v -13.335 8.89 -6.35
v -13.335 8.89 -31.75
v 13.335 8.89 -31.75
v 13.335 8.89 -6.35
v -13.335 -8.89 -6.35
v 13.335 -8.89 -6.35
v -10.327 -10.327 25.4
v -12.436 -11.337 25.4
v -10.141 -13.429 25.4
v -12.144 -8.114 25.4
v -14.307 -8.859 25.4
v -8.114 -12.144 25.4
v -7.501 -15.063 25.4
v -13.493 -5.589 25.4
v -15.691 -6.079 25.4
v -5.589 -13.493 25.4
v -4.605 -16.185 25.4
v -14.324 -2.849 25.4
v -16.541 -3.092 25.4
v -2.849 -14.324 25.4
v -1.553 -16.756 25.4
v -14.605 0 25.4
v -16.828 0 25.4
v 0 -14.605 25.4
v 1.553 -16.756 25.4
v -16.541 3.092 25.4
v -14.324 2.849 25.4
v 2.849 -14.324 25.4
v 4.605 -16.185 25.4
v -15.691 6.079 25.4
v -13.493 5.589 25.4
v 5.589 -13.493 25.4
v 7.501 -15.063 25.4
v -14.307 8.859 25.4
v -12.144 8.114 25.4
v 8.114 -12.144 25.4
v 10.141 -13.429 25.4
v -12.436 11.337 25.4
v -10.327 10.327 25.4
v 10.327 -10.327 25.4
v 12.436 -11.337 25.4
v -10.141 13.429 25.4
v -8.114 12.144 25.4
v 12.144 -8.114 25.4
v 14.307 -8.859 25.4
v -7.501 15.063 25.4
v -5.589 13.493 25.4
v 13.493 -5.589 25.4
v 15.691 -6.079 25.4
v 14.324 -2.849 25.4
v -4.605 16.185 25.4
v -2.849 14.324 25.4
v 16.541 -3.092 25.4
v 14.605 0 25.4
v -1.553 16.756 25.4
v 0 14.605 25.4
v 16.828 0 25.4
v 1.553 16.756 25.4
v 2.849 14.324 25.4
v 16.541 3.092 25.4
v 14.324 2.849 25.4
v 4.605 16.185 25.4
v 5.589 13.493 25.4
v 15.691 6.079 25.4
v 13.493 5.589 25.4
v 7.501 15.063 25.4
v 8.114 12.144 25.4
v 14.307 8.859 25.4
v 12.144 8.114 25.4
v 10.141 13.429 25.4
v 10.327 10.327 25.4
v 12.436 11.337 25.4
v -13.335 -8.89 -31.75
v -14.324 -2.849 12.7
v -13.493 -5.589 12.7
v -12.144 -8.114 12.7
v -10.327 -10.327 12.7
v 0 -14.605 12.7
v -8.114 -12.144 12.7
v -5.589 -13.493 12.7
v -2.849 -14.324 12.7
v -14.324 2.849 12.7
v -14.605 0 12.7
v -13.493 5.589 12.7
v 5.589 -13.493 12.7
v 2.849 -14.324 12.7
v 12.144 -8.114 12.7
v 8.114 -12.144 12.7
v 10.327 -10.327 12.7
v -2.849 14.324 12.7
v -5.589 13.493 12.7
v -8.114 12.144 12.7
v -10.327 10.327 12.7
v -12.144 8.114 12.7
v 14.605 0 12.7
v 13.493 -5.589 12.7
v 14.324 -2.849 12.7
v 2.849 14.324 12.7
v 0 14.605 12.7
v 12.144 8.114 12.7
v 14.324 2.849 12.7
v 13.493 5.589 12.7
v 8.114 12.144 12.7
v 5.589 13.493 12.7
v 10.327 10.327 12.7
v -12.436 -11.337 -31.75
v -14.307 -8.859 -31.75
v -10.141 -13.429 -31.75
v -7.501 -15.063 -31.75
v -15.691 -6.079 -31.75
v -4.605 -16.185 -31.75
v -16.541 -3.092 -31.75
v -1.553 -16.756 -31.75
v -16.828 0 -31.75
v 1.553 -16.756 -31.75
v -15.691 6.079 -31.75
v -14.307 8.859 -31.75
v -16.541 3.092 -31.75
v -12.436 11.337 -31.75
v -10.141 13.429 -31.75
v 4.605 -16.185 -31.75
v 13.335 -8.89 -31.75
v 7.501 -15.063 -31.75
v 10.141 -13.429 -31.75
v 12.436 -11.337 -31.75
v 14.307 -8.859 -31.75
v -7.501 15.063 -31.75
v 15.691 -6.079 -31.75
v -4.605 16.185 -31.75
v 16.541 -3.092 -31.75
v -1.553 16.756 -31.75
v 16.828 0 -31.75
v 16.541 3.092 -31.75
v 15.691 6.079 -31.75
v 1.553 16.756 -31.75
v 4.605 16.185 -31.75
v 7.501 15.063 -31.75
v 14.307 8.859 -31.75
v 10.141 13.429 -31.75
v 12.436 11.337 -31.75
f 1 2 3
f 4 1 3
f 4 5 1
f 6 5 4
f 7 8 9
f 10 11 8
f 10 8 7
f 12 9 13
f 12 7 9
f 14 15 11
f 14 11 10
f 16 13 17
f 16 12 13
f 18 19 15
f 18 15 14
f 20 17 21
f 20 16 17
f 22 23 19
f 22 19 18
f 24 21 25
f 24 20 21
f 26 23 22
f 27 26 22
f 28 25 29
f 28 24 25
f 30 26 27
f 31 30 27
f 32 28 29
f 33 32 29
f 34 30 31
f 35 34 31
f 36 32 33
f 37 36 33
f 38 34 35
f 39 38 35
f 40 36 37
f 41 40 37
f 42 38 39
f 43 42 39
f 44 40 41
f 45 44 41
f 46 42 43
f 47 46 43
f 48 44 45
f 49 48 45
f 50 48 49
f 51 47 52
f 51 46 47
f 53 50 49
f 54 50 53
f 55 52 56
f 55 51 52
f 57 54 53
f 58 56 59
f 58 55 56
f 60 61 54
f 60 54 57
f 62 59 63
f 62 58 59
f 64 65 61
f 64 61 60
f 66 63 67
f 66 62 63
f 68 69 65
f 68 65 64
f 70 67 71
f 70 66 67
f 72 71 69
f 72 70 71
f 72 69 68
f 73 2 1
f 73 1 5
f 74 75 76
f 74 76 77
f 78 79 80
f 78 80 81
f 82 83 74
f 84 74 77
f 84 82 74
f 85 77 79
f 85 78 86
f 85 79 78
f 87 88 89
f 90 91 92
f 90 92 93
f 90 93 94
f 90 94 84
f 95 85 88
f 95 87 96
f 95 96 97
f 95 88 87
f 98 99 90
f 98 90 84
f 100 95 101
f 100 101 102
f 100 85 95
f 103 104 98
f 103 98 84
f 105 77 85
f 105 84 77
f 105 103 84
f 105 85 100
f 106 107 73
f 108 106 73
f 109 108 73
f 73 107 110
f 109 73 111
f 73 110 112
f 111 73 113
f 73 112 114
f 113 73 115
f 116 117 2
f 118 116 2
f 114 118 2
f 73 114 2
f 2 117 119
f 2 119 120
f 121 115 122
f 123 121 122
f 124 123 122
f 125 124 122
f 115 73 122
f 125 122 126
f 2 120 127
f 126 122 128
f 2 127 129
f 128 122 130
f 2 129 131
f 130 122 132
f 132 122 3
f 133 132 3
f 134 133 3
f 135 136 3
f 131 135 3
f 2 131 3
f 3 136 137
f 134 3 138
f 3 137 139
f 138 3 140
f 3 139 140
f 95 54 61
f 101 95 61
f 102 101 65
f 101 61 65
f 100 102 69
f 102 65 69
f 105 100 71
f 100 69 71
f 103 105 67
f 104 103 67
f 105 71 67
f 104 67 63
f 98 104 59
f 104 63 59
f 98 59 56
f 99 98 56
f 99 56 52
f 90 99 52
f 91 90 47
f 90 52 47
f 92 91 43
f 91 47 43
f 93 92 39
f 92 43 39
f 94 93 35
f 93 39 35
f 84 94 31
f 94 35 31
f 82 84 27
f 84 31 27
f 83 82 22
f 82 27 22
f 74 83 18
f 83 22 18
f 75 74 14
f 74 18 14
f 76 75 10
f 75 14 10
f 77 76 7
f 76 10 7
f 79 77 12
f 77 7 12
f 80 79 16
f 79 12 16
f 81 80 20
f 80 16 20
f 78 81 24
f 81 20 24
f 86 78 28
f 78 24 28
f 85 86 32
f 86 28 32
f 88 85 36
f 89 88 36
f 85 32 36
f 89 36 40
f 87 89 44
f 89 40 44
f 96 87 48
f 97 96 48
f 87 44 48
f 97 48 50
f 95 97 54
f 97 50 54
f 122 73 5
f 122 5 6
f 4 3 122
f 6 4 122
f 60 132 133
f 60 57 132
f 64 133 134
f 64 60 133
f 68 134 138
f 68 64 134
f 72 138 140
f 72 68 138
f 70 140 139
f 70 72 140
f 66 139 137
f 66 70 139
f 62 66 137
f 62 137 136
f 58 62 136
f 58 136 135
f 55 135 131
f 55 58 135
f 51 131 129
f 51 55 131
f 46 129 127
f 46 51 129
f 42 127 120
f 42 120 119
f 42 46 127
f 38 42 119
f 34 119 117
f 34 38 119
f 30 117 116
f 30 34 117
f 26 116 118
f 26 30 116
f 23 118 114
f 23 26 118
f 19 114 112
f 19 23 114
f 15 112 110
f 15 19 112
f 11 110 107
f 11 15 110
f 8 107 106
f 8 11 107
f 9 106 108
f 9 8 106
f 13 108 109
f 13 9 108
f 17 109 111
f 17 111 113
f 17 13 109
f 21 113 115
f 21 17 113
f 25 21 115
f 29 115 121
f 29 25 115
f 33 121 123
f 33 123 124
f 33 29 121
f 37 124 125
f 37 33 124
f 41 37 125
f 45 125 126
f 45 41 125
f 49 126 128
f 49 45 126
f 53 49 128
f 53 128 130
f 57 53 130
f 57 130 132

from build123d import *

# Parameters (mm, degrees)
F0_R          = 16.8275
F1_DEPTH      = 25.4
F1_DEPTH_BACK = 31.75
F3_R          = 14.605
F4_DEPTH      = 12.7
F6_W          = 26.67
F6_H          = 17.78
F7_DEPTH      = 25.4


with BuildPart() as f1:
    # F0 (on Top) → F1 (new body, two sides)
    with BuildSketch(Plane.XY) as f1_sk:
        Circle(F0_R)
    extrude(amount=F1_DEPTH)
    extrude(f1_sk.sketch, amount=-F1_DEPTH_BACK)

    # F3 (on offset) → F4 (cut)
    with BuildSketch(Plane.XY.offset(25.4)):
        Circle(F3_R)
    extrude(amount=-F4_DEPTH, mode=Mode.SUBTRACT)

    # F6 (on offset) → F7 (cut)
    with BuildSketch(Plane(origin=(0, 0, -31.75), x_dir=(1, 0, 0), z_dir=(0, 0, -1))):
        Rectangle(F6_W, F6_H)
    extrude(amount=-F7_DEPTH, mode=Mode.SUBTRACT)


solid = f1.part
